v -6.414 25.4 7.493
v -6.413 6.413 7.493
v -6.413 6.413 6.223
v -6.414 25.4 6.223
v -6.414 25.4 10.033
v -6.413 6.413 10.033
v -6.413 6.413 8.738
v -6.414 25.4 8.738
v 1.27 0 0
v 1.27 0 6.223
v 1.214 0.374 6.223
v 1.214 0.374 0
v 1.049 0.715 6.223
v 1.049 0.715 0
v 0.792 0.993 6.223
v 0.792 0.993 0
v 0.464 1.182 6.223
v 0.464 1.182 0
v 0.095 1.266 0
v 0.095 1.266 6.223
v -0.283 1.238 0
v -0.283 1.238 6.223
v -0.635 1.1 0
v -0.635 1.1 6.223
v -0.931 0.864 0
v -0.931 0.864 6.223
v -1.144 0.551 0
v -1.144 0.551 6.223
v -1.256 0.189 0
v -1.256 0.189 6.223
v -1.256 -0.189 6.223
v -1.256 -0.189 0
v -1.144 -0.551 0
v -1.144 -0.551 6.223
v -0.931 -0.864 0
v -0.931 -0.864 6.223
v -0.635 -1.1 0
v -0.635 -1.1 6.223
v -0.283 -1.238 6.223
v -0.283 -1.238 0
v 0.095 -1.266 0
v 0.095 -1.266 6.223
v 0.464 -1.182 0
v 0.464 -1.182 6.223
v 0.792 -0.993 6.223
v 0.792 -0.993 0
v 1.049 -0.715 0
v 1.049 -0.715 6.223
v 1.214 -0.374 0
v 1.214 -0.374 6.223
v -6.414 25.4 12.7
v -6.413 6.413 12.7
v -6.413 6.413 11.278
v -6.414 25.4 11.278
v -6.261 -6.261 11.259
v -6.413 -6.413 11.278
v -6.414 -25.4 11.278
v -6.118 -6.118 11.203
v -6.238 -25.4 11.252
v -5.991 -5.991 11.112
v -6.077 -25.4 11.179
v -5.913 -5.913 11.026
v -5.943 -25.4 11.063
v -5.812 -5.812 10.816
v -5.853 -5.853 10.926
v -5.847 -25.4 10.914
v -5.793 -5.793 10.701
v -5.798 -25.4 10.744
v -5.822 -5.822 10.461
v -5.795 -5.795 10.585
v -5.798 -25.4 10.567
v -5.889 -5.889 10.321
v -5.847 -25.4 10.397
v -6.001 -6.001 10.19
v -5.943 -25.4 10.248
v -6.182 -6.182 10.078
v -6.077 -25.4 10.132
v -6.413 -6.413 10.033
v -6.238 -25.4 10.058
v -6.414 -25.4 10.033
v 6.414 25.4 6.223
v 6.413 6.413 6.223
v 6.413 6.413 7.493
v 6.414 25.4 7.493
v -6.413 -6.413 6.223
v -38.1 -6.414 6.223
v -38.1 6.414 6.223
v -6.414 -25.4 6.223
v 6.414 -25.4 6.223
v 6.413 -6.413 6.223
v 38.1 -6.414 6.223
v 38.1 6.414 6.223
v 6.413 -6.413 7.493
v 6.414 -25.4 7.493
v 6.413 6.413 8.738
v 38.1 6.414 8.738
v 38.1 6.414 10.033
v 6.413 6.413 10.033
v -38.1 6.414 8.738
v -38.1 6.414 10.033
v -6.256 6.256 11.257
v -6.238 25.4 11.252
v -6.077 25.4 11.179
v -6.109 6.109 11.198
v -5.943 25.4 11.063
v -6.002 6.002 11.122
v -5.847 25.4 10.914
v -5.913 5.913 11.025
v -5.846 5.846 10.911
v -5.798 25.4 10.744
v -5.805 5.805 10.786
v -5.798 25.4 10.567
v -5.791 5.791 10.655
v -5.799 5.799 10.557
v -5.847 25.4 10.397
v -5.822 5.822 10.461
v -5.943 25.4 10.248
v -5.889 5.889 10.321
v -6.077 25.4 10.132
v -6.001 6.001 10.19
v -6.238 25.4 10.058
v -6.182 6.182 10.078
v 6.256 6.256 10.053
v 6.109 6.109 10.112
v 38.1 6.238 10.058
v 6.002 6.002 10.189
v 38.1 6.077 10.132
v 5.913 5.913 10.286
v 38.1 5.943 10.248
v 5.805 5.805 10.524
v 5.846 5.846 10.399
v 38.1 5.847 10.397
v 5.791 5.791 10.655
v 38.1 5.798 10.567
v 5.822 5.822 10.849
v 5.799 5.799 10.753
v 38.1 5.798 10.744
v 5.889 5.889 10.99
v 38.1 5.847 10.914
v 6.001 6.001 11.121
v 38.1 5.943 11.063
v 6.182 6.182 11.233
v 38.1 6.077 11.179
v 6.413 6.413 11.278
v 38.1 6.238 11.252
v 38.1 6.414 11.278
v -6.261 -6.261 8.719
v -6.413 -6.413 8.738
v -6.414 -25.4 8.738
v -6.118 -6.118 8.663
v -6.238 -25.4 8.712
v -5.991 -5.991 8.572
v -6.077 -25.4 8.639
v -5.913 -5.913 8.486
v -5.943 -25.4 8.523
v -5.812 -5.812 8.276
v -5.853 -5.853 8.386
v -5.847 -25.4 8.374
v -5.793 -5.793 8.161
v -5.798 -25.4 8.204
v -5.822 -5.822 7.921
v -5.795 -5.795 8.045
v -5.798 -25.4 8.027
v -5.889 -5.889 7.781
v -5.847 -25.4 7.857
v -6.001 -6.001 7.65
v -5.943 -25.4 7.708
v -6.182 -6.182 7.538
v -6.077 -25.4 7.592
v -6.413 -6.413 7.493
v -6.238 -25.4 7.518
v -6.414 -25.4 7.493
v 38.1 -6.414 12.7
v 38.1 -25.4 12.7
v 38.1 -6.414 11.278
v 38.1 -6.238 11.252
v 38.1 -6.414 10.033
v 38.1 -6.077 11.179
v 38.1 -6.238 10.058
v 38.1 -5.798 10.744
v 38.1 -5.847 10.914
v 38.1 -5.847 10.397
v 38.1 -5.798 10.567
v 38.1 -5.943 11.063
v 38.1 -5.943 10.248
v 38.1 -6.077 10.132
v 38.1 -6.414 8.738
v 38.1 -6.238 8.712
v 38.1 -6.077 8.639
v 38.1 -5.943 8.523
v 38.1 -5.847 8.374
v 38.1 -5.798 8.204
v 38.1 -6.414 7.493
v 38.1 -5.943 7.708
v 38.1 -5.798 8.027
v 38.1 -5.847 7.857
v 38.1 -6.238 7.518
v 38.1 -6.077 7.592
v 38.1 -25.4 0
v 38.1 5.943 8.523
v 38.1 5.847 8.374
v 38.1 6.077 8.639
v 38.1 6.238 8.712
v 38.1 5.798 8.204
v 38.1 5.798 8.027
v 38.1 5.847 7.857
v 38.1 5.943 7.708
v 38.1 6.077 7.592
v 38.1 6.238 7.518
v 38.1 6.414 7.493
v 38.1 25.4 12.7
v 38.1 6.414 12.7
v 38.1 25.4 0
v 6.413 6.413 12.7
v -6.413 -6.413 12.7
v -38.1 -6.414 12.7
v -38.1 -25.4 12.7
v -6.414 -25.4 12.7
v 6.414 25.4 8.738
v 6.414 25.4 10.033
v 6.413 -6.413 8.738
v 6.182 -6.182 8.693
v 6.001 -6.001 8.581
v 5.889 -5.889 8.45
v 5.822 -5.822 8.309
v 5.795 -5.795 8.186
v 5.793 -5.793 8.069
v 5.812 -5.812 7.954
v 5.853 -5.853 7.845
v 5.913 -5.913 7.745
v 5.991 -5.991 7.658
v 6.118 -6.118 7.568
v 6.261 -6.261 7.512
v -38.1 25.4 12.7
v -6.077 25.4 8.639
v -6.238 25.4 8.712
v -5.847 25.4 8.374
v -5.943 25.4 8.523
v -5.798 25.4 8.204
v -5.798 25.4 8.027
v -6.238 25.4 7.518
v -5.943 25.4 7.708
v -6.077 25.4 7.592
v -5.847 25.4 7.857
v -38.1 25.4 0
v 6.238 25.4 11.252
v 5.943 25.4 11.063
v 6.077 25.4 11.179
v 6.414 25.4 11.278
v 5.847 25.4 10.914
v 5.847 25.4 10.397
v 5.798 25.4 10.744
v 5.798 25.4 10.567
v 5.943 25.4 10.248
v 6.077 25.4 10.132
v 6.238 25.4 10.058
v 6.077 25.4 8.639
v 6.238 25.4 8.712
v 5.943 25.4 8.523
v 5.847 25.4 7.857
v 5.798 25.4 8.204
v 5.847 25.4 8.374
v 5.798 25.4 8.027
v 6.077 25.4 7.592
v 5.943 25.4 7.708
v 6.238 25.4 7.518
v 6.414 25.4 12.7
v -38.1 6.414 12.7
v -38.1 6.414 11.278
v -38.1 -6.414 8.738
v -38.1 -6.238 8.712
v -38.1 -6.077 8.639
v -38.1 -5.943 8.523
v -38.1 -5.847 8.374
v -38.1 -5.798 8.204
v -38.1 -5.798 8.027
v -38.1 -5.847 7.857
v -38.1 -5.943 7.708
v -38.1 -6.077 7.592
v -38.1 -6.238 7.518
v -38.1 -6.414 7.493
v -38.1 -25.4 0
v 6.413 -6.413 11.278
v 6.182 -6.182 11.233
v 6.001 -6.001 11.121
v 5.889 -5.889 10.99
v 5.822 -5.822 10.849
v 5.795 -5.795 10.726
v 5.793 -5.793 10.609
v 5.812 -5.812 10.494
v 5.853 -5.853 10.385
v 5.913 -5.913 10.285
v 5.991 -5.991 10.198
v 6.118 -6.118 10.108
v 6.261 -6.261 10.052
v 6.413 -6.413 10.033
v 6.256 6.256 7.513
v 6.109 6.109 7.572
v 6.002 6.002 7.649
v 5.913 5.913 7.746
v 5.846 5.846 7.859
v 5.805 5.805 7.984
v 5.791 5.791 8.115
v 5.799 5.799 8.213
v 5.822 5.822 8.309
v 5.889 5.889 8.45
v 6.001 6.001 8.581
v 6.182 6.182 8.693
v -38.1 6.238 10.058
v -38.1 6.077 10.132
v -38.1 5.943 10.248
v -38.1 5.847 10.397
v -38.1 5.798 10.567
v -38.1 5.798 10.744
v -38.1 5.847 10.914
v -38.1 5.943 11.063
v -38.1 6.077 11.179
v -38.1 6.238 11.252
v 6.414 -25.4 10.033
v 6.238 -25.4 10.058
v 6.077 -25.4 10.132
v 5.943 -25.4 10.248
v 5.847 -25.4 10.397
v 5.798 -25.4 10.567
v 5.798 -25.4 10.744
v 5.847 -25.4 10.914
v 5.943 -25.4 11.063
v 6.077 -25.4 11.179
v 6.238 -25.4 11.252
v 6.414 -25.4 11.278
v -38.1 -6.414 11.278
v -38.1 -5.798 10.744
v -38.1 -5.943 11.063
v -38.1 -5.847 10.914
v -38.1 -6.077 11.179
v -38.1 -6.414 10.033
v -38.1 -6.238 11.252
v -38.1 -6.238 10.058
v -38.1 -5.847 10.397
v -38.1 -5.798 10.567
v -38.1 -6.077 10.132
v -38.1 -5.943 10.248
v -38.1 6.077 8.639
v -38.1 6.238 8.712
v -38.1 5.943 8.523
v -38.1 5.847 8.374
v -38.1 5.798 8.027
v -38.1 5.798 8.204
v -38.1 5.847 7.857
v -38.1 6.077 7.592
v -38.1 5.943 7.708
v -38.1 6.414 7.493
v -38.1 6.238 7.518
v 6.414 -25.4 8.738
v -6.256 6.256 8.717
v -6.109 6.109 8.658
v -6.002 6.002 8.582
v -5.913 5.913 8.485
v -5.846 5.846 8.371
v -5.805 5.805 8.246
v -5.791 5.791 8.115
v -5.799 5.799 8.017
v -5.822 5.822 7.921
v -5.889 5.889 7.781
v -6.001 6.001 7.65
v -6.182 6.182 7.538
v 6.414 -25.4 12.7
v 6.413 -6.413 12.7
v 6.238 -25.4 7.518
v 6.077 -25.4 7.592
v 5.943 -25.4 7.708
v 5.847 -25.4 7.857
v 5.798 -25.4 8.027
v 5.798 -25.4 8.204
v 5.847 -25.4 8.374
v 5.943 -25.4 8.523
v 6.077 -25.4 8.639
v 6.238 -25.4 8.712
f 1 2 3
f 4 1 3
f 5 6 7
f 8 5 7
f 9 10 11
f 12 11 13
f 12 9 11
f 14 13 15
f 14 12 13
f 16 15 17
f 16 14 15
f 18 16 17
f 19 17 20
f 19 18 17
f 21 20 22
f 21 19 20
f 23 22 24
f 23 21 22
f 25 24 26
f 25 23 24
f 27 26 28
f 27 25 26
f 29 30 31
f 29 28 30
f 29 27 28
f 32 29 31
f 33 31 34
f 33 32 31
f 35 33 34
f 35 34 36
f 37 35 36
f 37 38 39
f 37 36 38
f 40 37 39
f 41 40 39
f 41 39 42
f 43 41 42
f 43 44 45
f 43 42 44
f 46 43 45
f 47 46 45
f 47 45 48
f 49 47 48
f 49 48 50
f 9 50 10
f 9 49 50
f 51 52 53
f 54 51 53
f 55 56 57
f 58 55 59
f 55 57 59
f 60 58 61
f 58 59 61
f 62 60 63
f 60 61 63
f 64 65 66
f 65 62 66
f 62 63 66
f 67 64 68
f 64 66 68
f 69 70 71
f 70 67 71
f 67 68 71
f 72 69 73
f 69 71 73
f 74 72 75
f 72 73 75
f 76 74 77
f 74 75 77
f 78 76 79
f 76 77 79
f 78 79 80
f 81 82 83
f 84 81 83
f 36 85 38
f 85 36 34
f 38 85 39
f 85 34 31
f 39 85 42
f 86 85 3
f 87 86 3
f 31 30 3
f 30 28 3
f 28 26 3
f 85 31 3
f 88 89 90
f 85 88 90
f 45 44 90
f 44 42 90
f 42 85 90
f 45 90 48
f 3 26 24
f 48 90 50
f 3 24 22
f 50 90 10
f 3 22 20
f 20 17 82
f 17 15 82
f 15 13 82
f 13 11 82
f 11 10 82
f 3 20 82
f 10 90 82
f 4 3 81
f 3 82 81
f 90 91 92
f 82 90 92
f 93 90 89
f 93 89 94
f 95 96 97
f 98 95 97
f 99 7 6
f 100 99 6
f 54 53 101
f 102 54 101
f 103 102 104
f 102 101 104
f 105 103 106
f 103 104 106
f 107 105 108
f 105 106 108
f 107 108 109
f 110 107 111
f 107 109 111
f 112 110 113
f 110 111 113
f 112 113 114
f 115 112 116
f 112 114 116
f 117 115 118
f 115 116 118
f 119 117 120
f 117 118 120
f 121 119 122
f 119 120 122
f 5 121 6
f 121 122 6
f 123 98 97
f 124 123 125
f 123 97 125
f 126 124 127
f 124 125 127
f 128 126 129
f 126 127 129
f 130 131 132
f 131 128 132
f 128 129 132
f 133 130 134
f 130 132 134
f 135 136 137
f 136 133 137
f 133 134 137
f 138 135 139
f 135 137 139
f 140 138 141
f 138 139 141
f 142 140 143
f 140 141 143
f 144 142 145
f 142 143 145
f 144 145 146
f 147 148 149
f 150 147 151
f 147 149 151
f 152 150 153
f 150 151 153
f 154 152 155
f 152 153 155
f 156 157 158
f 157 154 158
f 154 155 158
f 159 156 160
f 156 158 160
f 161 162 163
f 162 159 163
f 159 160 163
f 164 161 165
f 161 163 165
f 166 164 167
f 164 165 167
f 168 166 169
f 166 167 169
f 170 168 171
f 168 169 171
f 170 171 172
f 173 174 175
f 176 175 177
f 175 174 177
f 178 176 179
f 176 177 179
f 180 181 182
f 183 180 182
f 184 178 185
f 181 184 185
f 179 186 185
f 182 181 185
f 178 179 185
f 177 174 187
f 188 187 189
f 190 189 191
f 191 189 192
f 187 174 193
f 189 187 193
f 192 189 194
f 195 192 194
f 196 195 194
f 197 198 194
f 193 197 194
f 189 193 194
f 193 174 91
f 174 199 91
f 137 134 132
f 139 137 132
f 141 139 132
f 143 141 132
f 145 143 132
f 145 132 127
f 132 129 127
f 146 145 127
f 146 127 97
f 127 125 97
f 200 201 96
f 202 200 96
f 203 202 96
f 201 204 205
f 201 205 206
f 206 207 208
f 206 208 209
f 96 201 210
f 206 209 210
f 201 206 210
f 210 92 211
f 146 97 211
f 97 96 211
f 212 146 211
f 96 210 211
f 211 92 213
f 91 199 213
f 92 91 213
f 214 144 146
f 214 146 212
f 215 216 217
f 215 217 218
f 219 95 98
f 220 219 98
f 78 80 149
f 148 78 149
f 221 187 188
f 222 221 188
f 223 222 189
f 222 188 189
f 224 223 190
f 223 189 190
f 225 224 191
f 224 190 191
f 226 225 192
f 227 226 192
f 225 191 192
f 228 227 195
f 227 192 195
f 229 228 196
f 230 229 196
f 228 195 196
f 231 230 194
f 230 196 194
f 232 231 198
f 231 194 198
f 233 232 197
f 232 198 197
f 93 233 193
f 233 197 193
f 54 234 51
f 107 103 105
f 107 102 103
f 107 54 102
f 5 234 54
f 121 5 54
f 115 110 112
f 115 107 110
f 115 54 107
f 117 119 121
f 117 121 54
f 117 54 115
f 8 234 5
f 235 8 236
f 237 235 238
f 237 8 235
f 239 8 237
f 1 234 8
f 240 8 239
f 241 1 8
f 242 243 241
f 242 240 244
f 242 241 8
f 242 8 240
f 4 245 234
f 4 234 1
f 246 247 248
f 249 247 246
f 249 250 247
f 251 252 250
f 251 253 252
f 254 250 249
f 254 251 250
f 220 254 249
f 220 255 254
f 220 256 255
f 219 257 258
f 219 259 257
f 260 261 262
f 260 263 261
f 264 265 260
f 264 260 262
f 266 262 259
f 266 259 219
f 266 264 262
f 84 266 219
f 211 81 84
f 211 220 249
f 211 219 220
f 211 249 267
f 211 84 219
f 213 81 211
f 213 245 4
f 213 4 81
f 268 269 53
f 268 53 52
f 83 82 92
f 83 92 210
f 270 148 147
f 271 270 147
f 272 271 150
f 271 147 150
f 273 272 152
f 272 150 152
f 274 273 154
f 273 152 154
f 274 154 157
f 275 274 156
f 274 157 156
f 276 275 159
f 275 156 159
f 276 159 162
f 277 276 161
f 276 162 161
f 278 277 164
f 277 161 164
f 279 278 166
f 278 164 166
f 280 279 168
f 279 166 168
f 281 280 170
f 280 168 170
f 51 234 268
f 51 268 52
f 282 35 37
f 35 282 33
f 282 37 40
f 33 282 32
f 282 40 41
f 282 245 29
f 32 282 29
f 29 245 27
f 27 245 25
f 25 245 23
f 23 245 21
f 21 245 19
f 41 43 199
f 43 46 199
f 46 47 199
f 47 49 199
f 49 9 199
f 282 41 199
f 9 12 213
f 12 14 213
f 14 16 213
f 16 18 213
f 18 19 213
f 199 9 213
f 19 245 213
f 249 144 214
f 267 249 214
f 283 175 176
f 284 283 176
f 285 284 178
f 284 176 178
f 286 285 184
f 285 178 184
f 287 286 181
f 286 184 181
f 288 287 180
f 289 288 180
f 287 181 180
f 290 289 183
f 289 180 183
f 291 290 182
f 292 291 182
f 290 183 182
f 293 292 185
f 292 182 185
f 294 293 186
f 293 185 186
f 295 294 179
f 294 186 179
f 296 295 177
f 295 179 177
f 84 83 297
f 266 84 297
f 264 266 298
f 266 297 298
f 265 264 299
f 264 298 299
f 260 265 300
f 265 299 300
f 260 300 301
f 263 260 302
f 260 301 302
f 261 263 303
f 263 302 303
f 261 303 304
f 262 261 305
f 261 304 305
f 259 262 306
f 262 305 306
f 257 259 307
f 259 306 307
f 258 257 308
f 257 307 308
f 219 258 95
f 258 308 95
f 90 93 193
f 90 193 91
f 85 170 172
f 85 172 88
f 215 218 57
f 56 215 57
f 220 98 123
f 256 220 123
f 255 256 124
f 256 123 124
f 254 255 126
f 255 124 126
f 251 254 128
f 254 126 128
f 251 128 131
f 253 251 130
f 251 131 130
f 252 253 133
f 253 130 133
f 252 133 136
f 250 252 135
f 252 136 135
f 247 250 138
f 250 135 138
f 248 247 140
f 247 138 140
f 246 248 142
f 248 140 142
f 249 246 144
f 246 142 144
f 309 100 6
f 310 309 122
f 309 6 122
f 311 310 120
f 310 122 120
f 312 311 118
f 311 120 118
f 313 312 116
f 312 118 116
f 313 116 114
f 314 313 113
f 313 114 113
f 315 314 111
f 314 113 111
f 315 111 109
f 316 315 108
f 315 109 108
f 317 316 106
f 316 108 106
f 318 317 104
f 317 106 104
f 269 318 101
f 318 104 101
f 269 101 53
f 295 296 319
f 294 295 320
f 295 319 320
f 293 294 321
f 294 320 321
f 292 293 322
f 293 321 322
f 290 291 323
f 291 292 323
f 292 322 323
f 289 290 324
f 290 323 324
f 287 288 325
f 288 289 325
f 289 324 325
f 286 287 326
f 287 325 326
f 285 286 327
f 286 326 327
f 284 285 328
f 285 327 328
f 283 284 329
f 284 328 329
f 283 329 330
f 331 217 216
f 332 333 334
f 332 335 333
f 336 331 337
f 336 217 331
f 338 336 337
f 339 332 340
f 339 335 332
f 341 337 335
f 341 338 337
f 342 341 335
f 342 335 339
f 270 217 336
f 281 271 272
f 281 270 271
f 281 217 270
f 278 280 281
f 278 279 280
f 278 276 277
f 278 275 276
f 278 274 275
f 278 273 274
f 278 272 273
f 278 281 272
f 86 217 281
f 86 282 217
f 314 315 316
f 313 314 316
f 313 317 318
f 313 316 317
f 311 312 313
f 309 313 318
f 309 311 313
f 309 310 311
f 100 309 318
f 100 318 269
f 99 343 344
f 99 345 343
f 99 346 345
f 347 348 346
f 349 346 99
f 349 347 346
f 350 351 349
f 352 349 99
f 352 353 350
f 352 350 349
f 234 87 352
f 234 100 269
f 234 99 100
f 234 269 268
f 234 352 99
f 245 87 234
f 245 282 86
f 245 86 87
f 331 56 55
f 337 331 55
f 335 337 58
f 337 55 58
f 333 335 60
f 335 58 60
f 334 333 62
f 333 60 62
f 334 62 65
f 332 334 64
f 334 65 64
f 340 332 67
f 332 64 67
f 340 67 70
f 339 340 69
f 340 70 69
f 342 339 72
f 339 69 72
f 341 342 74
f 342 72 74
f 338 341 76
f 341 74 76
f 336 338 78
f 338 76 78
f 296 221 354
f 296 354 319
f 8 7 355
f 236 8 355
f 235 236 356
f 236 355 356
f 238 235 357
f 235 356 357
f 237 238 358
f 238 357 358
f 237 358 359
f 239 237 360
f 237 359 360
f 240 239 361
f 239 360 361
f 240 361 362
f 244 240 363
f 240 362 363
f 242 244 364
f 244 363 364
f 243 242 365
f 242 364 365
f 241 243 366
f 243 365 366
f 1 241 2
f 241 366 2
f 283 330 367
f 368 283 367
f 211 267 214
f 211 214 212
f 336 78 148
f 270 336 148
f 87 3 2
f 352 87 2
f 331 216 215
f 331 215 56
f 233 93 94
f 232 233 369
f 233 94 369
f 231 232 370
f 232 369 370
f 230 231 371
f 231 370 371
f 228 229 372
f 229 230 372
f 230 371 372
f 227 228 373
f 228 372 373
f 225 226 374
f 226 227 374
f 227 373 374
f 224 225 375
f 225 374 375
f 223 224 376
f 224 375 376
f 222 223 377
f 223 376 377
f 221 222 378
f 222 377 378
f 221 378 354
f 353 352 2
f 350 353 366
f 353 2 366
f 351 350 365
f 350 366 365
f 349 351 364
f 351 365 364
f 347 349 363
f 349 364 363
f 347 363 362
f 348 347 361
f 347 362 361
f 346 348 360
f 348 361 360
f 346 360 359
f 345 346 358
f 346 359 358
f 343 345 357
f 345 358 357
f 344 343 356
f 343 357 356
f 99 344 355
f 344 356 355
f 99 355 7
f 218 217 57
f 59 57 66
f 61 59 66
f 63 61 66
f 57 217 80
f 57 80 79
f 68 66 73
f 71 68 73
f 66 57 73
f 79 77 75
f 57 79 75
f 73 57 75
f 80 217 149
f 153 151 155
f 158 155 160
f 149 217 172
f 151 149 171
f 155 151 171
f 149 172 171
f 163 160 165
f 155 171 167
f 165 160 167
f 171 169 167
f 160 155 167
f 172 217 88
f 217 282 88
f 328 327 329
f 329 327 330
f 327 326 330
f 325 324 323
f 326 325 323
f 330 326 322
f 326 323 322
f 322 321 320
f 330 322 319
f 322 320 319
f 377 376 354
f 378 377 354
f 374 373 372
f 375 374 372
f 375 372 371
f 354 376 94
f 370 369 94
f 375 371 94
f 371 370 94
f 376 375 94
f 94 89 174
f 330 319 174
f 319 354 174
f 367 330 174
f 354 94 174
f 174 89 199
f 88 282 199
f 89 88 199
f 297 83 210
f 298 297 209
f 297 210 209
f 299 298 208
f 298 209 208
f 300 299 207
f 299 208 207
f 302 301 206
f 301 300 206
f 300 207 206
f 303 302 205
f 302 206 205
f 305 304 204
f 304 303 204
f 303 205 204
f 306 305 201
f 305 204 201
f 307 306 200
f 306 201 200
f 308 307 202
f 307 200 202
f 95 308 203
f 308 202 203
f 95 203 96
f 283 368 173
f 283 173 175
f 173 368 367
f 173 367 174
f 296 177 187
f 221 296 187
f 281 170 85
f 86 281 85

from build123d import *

# Parameters (mm, degrees)
F0_W     = 76.2
F0_H     = 50.8
F1_DEPTH = 12.7
F3_DEPTH = 50.801
F5_DEPTH = 76.201
F6_R     = 1.27
F7_DEPTH = 12.701


# Not quite as in the source:
# - a feature names something its author has since deleted; it is built from what else it names


with BuildPart() as f1:
    # F0 (on Top) → F1 (new body)
    with BuildSketch(Plane.XY):
        Rectangle(F0_W, F0_H)
    extrude(amount=F1_DEPTH)

    # F2 (on face) → F3 (cut, through all)
    with BuildSketch(Plane.XZ.offset(25.4)):
        with BuildLine():
            Line((6.4135, 12.7), (-6.4135, 12.7))
            Line((-6.4135, 12.7), (-6.4135, 11.2776))
            ThreePointArc((-6.4135, 11.2776), (-5.7912, 10.6553), (-6.4135, 10.033))
            Line((-6.4135, 10.033), (-6.4135, 8.7376))
            ThreePointArc((-6.4135, 8.7376), (-5.7912, 8.1153), (-6.4135, 7.493))
            Line((-6.4135, 7.493), (-6.4135, 6.223))
            Line((-6.4135, 6.223), (6.4135, 6.223))
            Line((6.4135, 6.223), (6.4135, 7.493))
            ThreePointArc((6.4135, 7.493), (5.7912, 8.1153), (6.4135, 8.7376))
            Line((6.4135, 8.7376), (6.4135, 10.033))
            ThreePointArc((6.4135, 10.033), (5.7912, 10.6553), (6.4135, 11.2776))
            Line((6.4135, 11.2776), (6.4135, 12.7))
        make_face()
    extrude(amount=-F3_DEPTH, mode=Mode.SUBTRACT)

    # F4 (on face) → F5 (cut, through all)
    with BuildSketch(Plane.YZ.offset(38.1)):
        with BuildLine():
            Line((6.4135, 12.7), (-6.4135, 12.7))
            Line((-6.4135, 12.7), (-6.4135, 11.2776))
            ThreePointArc((-6.4135, 11.2776), (-5.7912, 10.6553), (-6.4135, 10.033))
            Line((-6.4135, 10.033), (-6.4135, 8.7376))
            ThreePointArc((-6.4135, 8.7376), (-5.7912, 8.1153), (-6.4135, 7.493))
            Line((-6.4135, 7.493), (-6.4135, 6.223))
            Line((-6.4135, 6.223), (6.4135, 6.223))
            Line((6.4135, 6.223), (6.4135, 7.493))
            ThreePointArc((6.4135, 7.493), (5.7912, 8.1153), (6.4135, 8.7376))
            Line((6.4135, 8.7376), (6.4135, 10.033))
            ThreePointArc((6.4135, 10.033), (5.7912, 10.6553), (6.4135, 11.2776))
            Line((6.4135, 11.2776), (6.4135, 12.7))
        make_face()
    extrude(amount=-F5_DEPTH, mode=Mode.SUBTRACT)

    # F6 (on Top) → F7 (cut, through all)
    with BuildSketch(Plane.XY):
        Circle(F6_R)
    extrude(amount=F7_DEPTH, mode=Mode.SUBTRACT)


solid = f1.part
